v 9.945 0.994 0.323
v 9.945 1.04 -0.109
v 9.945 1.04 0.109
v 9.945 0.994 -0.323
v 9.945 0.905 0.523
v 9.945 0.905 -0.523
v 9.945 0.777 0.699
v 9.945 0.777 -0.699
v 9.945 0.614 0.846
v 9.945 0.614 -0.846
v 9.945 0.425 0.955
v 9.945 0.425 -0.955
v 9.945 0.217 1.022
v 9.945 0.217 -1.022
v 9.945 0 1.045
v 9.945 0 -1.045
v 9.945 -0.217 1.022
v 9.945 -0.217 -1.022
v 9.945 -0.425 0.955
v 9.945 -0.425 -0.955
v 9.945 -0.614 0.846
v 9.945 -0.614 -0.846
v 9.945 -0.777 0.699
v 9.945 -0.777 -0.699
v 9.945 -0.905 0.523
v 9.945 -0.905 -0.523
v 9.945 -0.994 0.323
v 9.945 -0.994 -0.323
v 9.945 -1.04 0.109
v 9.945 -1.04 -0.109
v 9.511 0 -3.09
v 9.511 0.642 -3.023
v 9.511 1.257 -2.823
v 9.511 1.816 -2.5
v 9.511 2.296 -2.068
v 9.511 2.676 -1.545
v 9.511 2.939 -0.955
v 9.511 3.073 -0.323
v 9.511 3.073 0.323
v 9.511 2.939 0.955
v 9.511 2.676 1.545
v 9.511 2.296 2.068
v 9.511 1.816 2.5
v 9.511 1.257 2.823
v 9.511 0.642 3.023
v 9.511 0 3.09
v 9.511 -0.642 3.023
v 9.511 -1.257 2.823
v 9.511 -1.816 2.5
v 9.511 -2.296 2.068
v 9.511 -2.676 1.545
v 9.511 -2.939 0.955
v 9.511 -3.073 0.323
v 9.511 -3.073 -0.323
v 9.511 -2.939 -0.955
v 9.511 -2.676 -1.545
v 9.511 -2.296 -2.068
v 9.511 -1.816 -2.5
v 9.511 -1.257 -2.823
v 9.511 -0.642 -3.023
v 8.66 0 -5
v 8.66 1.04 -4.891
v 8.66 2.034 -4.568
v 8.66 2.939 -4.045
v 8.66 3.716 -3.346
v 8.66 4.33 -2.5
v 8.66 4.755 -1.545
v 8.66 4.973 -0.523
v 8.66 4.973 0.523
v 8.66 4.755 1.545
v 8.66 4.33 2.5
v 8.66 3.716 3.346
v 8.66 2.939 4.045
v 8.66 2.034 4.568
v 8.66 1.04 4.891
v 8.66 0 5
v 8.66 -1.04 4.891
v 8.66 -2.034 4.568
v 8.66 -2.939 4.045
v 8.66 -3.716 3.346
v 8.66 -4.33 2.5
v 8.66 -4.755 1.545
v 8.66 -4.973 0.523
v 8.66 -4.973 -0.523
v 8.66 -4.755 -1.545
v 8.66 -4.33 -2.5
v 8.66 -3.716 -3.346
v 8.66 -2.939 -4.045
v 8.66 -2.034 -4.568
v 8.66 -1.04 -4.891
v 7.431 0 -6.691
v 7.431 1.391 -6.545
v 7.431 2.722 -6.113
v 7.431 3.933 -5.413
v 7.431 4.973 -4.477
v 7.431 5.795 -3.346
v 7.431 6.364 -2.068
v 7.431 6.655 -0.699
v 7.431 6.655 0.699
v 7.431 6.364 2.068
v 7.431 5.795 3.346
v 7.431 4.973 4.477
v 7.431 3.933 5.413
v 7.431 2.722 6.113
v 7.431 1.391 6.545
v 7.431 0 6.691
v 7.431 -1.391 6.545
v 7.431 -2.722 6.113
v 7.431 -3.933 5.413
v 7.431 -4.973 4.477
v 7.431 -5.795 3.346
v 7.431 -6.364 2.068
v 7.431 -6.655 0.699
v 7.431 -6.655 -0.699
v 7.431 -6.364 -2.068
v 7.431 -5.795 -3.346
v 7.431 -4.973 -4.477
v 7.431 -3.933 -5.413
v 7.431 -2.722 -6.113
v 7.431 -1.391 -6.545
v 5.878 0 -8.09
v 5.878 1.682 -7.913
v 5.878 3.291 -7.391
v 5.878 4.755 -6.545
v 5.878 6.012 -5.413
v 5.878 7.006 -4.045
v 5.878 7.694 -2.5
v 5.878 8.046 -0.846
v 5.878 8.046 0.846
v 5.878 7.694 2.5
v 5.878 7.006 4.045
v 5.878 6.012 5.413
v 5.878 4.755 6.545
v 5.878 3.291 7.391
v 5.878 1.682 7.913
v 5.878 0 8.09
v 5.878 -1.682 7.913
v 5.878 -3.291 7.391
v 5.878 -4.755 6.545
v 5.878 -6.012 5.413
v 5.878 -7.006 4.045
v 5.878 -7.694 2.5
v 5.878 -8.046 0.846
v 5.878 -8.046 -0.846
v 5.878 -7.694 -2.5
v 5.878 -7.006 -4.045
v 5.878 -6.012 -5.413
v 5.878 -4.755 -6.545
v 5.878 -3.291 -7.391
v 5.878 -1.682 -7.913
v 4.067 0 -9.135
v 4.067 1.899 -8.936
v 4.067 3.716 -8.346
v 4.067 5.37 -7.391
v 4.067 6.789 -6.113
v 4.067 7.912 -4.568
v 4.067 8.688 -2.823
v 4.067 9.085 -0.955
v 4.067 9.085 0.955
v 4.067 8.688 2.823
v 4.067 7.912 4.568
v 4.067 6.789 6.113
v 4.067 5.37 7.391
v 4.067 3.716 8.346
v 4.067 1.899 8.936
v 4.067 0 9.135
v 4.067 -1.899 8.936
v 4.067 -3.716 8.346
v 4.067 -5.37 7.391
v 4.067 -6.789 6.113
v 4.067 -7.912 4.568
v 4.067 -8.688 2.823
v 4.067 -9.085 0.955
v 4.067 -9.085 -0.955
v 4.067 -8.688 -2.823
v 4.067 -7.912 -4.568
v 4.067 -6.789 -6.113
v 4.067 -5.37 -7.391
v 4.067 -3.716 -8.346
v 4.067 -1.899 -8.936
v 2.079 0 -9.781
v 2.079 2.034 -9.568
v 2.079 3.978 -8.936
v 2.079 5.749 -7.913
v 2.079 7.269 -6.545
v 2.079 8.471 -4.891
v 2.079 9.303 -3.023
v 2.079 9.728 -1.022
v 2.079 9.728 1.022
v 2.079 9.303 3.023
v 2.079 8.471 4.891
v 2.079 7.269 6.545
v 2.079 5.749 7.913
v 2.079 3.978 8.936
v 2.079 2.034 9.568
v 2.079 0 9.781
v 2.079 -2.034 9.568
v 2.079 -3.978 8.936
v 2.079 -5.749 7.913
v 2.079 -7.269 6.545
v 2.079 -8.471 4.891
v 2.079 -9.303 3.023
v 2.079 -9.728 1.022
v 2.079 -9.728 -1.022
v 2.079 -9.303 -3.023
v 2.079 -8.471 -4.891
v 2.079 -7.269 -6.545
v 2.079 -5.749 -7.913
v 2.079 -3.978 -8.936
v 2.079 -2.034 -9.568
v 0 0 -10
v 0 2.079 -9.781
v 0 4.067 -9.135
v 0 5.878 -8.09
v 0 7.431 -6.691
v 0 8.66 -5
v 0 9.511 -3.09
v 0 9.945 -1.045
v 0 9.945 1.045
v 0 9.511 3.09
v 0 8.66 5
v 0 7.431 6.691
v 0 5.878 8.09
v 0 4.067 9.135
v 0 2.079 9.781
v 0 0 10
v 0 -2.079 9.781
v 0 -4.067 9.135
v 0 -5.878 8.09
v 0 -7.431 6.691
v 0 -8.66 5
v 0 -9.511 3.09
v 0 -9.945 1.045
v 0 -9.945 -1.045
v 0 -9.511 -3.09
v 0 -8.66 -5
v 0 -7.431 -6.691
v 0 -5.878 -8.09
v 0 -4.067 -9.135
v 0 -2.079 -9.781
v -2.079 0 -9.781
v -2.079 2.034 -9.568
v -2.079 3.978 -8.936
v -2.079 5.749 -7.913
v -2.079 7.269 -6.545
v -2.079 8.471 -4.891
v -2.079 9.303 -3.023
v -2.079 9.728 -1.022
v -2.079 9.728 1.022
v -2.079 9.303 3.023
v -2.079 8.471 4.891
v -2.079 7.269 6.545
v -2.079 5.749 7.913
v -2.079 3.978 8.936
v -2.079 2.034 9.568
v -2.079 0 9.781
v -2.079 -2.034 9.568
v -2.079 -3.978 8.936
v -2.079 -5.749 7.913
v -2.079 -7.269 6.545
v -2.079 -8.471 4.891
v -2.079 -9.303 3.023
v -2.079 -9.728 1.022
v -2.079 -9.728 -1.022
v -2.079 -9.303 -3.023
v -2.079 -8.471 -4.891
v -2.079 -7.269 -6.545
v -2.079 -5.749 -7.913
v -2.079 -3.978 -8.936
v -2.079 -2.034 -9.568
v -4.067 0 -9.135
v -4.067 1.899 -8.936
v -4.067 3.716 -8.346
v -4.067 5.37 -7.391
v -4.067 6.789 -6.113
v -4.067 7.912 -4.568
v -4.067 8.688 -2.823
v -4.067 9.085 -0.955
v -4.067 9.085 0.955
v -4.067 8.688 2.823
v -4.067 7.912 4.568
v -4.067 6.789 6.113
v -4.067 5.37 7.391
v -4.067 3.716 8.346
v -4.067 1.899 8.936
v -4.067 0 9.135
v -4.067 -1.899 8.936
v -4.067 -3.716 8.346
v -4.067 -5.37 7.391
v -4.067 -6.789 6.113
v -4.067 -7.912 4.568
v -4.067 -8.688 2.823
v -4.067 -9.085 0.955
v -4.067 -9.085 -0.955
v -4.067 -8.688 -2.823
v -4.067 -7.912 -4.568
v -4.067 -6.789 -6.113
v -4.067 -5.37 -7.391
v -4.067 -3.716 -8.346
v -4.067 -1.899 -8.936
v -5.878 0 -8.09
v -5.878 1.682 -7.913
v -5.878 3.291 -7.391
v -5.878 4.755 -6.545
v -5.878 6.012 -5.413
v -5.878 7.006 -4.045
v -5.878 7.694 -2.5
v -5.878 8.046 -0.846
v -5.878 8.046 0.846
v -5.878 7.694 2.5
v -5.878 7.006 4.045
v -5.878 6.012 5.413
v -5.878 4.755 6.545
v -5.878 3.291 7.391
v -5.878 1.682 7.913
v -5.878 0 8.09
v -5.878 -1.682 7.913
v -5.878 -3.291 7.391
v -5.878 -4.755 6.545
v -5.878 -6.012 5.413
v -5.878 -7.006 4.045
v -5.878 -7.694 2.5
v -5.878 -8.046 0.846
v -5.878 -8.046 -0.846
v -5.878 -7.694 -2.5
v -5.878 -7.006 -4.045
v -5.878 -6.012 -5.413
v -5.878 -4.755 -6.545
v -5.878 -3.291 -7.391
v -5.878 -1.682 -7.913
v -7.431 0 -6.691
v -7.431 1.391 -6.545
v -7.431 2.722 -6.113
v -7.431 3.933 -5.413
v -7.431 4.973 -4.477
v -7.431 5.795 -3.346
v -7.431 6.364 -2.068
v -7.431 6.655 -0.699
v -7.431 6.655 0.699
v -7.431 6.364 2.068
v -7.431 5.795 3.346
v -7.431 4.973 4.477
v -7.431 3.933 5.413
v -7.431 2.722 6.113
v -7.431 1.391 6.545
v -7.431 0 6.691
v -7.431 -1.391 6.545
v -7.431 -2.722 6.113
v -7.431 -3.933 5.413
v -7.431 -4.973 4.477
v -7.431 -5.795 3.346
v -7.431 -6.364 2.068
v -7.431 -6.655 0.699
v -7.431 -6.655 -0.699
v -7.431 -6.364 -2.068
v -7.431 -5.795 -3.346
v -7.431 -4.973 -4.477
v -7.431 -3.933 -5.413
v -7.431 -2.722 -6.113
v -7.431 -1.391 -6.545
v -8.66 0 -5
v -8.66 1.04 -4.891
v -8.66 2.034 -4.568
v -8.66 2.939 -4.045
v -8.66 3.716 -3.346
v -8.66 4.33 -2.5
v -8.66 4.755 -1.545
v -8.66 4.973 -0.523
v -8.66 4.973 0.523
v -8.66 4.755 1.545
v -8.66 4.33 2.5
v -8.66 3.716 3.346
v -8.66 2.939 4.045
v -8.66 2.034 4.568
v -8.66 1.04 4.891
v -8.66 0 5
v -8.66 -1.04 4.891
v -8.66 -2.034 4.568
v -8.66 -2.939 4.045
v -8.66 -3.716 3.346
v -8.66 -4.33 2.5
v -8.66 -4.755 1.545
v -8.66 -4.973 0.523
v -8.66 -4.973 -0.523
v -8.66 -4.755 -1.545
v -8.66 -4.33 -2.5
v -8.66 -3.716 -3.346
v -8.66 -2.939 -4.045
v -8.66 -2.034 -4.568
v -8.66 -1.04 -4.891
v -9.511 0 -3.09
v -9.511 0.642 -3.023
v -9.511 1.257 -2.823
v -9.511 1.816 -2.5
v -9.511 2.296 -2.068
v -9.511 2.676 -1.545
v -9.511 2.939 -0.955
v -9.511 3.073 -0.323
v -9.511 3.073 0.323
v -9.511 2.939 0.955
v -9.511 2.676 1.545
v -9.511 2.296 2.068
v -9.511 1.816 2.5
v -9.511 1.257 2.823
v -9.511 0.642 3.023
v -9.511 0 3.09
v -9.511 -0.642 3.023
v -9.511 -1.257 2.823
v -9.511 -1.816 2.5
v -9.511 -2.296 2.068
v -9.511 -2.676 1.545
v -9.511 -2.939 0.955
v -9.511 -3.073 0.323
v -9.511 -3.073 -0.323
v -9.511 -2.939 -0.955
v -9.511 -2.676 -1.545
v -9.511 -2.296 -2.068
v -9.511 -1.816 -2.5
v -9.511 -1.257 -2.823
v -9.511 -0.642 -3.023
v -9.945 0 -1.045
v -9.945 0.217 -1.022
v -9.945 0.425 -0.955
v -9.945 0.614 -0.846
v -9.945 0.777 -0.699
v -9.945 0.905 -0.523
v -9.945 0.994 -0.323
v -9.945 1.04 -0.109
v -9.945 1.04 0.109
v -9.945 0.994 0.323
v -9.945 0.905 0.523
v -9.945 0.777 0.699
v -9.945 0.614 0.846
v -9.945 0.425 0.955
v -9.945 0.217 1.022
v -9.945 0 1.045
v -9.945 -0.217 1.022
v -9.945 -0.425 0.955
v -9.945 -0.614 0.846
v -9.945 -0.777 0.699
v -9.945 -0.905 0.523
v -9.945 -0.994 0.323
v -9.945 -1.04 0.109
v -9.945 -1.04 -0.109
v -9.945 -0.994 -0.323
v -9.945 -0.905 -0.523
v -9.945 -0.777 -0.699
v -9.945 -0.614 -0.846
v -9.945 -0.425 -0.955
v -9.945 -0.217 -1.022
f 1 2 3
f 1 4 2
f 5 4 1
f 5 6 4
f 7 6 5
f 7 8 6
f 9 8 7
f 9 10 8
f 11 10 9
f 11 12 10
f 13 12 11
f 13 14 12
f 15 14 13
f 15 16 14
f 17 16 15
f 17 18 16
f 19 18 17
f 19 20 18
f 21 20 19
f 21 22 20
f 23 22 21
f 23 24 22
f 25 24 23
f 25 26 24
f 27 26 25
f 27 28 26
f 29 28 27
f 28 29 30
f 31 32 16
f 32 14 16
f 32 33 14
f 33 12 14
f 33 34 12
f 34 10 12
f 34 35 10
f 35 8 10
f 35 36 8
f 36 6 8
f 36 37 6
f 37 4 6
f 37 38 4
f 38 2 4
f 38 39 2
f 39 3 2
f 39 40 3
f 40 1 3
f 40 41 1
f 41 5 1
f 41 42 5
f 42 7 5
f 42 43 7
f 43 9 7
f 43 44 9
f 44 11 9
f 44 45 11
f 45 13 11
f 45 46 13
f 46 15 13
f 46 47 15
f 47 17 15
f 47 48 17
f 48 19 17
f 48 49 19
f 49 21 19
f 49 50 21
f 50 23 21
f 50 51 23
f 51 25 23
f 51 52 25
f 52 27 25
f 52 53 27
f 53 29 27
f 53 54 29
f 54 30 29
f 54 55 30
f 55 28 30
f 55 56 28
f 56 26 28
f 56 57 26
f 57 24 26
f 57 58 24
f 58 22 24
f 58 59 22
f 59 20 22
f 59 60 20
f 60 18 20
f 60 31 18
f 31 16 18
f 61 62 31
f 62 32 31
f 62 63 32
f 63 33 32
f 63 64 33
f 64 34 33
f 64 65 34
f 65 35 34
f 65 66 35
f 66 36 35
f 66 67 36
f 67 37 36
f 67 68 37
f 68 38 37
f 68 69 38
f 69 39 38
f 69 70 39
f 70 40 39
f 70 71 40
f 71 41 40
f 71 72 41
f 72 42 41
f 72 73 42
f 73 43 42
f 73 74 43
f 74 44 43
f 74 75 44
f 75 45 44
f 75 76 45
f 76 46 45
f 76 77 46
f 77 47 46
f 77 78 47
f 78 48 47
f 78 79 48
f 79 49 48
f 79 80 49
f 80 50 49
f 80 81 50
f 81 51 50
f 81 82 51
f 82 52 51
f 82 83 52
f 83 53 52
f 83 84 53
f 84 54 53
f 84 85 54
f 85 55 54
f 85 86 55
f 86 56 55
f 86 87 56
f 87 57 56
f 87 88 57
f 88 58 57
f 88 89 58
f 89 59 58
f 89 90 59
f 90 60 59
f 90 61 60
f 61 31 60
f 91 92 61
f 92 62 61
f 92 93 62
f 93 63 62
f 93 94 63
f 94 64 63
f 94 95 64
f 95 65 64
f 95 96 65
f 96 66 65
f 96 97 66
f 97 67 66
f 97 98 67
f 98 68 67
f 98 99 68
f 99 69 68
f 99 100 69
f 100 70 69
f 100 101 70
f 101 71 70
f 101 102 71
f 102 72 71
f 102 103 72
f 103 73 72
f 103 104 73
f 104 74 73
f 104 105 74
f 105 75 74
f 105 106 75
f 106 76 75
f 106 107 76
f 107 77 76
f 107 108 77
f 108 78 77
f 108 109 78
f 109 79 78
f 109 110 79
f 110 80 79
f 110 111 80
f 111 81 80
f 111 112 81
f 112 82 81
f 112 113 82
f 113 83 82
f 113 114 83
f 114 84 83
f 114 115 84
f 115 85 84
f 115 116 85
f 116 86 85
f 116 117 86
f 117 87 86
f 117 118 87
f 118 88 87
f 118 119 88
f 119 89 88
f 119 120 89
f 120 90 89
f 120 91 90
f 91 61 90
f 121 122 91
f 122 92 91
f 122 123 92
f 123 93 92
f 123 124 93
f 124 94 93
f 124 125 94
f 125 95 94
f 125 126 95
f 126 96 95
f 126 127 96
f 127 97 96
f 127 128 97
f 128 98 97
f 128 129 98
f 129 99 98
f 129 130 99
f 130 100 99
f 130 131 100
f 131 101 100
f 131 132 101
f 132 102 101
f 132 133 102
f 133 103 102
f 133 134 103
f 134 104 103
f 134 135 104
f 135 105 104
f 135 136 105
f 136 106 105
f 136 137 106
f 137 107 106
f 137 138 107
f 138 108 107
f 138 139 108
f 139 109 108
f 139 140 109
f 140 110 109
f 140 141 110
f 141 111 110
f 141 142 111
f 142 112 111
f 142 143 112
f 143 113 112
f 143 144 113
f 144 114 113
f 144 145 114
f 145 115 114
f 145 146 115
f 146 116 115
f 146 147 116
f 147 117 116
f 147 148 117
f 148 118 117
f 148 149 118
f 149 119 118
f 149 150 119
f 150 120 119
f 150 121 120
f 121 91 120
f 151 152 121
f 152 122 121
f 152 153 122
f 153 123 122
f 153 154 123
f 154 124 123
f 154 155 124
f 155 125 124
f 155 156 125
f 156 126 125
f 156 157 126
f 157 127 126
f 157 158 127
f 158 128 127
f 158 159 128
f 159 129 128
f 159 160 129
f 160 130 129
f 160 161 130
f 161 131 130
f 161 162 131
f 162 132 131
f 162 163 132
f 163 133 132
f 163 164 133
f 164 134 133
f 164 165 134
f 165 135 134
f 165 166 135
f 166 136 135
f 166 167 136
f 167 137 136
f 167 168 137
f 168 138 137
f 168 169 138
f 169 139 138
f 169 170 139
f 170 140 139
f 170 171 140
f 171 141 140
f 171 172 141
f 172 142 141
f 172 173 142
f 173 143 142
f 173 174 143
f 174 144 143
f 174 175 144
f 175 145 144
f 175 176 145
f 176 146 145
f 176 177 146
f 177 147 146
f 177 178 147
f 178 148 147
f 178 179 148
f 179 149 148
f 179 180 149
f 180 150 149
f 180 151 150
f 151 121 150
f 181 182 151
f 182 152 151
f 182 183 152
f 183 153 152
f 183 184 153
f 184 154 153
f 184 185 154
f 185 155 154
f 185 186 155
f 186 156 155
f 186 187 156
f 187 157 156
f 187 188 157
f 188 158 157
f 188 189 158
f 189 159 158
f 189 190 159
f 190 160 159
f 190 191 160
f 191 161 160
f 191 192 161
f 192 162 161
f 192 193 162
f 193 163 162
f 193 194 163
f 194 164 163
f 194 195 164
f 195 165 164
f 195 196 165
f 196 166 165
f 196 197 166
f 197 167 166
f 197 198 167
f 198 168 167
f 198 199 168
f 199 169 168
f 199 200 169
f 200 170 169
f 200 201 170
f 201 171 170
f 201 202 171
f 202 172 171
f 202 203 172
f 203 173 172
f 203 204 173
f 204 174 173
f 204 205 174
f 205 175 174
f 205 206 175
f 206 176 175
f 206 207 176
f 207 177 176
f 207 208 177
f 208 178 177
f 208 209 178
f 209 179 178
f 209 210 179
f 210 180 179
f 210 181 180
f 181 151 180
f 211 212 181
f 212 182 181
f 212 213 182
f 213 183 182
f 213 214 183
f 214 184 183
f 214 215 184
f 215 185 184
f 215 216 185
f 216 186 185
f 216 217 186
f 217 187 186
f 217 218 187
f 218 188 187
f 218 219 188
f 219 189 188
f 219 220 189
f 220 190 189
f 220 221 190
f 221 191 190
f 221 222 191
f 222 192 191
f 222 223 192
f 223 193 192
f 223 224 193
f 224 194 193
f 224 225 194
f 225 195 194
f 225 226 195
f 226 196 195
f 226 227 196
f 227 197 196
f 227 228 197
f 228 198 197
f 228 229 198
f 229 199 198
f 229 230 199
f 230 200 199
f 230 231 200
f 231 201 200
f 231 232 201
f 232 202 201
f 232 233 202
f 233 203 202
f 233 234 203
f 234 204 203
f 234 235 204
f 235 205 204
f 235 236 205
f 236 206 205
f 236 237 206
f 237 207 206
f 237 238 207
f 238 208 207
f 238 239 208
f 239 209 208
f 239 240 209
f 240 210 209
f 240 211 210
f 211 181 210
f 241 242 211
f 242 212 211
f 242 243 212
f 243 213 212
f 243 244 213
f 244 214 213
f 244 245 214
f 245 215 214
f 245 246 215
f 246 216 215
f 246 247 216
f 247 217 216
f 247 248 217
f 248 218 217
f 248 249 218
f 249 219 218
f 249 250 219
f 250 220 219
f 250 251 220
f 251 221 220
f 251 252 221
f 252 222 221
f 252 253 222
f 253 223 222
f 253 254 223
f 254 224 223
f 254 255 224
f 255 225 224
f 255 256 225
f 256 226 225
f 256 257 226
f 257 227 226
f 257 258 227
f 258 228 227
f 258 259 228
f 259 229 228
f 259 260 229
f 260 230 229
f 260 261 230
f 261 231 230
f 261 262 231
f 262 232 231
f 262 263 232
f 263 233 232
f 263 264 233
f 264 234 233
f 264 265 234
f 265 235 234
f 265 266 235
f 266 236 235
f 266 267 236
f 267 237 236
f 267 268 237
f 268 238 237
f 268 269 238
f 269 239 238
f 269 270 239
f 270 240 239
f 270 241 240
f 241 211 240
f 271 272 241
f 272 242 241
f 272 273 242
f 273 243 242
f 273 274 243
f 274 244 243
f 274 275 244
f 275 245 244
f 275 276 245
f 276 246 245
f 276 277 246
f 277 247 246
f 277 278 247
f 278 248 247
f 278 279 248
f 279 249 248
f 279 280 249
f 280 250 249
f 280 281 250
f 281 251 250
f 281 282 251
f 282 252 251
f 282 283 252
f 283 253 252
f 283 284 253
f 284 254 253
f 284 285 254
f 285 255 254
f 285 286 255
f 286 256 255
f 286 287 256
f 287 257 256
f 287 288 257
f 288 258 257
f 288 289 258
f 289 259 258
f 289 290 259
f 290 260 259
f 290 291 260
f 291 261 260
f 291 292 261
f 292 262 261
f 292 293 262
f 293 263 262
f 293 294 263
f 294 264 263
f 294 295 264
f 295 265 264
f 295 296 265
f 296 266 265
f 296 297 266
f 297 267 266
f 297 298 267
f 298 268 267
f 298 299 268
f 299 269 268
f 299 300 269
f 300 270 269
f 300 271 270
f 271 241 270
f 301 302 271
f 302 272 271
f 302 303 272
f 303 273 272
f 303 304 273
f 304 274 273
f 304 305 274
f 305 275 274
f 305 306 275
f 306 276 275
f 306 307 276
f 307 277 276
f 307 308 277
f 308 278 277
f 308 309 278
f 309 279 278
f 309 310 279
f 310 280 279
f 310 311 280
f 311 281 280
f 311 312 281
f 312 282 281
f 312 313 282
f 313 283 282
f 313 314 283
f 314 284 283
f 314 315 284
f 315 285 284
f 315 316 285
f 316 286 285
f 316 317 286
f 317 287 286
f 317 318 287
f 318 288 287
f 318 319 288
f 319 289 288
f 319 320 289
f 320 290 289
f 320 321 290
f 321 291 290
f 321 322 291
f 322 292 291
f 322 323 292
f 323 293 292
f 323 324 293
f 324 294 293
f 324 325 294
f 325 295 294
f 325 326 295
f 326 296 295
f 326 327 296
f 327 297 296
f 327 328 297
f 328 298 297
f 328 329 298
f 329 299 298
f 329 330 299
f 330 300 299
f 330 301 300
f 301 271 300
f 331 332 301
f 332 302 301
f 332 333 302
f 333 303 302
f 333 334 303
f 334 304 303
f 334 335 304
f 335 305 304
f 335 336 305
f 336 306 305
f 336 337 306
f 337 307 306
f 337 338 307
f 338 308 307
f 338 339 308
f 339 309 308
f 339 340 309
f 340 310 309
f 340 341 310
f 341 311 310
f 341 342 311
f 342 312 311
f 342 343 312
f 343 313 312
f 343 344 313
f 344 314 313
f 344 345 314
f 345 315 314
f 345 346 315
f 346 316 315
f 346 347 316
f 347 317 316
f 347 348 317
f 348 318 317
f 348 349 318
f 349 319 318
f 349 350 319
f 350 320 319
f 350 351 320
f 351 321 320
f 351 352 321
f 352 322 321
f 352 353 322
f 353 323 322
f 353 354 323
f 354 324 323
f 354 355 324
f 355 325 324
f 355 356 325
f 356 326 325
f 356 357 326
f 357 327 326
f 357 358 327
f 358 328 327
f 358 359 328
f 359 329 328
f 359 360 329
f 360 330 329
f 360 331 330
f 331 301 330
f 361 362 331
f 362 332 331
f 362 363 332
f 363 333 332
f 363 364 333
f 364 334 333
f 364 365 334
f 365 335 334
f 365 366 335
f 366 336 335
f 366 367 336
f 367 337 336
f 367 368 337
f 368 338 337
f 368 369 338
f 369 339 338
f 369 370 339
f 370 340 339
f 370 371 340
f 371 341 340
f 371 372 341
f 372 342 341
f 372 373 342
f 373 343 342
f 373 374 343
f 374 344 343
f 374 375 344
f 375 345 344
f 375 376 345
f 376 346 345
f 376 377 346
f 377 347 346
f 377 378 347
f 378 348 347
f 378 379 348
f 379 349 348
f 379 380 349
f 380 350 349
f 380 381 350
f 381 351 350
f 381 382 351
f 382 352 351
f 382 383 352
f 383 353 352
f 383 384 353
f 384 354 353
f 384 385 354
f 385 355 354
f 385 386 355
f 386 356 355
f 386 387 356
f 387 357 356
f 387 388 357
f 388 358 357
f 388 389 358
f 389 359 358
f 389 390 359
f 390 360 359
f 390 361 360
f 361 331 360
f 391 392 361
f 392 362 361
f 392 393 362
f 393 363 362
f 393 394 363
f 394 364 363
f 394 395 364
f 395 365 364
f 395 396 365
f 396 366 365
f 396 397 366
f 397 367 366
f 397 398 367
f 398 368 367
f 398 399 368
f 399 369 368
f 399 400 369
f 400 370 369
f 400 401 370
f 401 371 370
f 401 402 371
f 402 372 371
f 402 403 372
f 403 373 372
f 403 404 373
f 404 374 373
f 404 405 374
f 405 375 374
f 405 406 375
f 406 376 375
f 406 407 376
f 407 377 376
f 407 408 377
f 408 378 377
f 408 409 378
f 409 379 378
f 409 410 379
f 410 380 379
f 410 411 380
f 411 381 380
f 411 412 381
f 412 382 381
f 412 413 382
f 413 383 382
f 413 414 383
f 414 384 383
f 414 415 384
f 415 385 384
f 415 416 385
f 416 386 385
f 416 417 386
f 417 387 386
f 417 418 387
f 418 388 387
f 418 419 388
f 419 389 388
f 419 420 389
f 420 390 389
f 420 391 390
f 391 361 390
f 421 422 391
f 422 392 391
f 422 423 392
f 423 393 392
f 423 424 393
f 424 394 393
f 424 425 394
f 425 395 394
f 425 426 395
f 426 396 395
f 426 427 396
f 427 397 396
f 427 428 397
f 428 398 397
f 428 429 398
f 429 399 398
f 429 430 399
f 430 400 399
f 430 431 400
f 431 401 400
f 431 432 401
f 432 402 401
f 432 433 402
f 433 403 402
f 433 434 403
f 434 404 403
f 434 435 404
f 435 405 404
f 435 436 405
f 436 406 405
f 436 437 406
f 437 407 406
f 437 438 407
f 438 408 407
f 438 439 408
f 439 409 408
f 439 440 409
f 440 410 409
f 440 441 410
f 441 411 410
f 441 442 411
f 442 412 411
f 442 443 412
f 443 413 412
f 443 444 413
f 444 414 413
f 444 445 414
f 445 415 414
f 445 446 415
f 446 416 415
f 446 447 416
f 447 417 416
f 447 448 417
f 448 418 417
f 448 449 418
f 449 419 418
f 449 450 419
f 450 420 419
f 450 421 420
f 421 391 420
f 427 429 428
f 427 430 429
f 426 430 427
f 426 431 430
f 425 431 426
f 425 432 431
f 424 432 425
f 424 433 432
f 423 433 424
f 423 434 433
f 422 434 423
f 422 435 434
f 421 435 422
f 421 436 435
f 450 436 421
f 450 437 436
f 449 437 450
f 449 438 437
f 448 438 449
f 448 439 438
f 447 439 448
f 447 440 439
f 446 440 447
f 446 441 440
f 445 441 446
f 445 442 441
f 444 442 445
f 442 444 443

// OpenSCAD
module body() {
    color("Blue") sphere(10);
}

module holeA() rotate([0,90,0]) body();

test = true;

if (test) {
    holeA();
}else{
    body();
}
